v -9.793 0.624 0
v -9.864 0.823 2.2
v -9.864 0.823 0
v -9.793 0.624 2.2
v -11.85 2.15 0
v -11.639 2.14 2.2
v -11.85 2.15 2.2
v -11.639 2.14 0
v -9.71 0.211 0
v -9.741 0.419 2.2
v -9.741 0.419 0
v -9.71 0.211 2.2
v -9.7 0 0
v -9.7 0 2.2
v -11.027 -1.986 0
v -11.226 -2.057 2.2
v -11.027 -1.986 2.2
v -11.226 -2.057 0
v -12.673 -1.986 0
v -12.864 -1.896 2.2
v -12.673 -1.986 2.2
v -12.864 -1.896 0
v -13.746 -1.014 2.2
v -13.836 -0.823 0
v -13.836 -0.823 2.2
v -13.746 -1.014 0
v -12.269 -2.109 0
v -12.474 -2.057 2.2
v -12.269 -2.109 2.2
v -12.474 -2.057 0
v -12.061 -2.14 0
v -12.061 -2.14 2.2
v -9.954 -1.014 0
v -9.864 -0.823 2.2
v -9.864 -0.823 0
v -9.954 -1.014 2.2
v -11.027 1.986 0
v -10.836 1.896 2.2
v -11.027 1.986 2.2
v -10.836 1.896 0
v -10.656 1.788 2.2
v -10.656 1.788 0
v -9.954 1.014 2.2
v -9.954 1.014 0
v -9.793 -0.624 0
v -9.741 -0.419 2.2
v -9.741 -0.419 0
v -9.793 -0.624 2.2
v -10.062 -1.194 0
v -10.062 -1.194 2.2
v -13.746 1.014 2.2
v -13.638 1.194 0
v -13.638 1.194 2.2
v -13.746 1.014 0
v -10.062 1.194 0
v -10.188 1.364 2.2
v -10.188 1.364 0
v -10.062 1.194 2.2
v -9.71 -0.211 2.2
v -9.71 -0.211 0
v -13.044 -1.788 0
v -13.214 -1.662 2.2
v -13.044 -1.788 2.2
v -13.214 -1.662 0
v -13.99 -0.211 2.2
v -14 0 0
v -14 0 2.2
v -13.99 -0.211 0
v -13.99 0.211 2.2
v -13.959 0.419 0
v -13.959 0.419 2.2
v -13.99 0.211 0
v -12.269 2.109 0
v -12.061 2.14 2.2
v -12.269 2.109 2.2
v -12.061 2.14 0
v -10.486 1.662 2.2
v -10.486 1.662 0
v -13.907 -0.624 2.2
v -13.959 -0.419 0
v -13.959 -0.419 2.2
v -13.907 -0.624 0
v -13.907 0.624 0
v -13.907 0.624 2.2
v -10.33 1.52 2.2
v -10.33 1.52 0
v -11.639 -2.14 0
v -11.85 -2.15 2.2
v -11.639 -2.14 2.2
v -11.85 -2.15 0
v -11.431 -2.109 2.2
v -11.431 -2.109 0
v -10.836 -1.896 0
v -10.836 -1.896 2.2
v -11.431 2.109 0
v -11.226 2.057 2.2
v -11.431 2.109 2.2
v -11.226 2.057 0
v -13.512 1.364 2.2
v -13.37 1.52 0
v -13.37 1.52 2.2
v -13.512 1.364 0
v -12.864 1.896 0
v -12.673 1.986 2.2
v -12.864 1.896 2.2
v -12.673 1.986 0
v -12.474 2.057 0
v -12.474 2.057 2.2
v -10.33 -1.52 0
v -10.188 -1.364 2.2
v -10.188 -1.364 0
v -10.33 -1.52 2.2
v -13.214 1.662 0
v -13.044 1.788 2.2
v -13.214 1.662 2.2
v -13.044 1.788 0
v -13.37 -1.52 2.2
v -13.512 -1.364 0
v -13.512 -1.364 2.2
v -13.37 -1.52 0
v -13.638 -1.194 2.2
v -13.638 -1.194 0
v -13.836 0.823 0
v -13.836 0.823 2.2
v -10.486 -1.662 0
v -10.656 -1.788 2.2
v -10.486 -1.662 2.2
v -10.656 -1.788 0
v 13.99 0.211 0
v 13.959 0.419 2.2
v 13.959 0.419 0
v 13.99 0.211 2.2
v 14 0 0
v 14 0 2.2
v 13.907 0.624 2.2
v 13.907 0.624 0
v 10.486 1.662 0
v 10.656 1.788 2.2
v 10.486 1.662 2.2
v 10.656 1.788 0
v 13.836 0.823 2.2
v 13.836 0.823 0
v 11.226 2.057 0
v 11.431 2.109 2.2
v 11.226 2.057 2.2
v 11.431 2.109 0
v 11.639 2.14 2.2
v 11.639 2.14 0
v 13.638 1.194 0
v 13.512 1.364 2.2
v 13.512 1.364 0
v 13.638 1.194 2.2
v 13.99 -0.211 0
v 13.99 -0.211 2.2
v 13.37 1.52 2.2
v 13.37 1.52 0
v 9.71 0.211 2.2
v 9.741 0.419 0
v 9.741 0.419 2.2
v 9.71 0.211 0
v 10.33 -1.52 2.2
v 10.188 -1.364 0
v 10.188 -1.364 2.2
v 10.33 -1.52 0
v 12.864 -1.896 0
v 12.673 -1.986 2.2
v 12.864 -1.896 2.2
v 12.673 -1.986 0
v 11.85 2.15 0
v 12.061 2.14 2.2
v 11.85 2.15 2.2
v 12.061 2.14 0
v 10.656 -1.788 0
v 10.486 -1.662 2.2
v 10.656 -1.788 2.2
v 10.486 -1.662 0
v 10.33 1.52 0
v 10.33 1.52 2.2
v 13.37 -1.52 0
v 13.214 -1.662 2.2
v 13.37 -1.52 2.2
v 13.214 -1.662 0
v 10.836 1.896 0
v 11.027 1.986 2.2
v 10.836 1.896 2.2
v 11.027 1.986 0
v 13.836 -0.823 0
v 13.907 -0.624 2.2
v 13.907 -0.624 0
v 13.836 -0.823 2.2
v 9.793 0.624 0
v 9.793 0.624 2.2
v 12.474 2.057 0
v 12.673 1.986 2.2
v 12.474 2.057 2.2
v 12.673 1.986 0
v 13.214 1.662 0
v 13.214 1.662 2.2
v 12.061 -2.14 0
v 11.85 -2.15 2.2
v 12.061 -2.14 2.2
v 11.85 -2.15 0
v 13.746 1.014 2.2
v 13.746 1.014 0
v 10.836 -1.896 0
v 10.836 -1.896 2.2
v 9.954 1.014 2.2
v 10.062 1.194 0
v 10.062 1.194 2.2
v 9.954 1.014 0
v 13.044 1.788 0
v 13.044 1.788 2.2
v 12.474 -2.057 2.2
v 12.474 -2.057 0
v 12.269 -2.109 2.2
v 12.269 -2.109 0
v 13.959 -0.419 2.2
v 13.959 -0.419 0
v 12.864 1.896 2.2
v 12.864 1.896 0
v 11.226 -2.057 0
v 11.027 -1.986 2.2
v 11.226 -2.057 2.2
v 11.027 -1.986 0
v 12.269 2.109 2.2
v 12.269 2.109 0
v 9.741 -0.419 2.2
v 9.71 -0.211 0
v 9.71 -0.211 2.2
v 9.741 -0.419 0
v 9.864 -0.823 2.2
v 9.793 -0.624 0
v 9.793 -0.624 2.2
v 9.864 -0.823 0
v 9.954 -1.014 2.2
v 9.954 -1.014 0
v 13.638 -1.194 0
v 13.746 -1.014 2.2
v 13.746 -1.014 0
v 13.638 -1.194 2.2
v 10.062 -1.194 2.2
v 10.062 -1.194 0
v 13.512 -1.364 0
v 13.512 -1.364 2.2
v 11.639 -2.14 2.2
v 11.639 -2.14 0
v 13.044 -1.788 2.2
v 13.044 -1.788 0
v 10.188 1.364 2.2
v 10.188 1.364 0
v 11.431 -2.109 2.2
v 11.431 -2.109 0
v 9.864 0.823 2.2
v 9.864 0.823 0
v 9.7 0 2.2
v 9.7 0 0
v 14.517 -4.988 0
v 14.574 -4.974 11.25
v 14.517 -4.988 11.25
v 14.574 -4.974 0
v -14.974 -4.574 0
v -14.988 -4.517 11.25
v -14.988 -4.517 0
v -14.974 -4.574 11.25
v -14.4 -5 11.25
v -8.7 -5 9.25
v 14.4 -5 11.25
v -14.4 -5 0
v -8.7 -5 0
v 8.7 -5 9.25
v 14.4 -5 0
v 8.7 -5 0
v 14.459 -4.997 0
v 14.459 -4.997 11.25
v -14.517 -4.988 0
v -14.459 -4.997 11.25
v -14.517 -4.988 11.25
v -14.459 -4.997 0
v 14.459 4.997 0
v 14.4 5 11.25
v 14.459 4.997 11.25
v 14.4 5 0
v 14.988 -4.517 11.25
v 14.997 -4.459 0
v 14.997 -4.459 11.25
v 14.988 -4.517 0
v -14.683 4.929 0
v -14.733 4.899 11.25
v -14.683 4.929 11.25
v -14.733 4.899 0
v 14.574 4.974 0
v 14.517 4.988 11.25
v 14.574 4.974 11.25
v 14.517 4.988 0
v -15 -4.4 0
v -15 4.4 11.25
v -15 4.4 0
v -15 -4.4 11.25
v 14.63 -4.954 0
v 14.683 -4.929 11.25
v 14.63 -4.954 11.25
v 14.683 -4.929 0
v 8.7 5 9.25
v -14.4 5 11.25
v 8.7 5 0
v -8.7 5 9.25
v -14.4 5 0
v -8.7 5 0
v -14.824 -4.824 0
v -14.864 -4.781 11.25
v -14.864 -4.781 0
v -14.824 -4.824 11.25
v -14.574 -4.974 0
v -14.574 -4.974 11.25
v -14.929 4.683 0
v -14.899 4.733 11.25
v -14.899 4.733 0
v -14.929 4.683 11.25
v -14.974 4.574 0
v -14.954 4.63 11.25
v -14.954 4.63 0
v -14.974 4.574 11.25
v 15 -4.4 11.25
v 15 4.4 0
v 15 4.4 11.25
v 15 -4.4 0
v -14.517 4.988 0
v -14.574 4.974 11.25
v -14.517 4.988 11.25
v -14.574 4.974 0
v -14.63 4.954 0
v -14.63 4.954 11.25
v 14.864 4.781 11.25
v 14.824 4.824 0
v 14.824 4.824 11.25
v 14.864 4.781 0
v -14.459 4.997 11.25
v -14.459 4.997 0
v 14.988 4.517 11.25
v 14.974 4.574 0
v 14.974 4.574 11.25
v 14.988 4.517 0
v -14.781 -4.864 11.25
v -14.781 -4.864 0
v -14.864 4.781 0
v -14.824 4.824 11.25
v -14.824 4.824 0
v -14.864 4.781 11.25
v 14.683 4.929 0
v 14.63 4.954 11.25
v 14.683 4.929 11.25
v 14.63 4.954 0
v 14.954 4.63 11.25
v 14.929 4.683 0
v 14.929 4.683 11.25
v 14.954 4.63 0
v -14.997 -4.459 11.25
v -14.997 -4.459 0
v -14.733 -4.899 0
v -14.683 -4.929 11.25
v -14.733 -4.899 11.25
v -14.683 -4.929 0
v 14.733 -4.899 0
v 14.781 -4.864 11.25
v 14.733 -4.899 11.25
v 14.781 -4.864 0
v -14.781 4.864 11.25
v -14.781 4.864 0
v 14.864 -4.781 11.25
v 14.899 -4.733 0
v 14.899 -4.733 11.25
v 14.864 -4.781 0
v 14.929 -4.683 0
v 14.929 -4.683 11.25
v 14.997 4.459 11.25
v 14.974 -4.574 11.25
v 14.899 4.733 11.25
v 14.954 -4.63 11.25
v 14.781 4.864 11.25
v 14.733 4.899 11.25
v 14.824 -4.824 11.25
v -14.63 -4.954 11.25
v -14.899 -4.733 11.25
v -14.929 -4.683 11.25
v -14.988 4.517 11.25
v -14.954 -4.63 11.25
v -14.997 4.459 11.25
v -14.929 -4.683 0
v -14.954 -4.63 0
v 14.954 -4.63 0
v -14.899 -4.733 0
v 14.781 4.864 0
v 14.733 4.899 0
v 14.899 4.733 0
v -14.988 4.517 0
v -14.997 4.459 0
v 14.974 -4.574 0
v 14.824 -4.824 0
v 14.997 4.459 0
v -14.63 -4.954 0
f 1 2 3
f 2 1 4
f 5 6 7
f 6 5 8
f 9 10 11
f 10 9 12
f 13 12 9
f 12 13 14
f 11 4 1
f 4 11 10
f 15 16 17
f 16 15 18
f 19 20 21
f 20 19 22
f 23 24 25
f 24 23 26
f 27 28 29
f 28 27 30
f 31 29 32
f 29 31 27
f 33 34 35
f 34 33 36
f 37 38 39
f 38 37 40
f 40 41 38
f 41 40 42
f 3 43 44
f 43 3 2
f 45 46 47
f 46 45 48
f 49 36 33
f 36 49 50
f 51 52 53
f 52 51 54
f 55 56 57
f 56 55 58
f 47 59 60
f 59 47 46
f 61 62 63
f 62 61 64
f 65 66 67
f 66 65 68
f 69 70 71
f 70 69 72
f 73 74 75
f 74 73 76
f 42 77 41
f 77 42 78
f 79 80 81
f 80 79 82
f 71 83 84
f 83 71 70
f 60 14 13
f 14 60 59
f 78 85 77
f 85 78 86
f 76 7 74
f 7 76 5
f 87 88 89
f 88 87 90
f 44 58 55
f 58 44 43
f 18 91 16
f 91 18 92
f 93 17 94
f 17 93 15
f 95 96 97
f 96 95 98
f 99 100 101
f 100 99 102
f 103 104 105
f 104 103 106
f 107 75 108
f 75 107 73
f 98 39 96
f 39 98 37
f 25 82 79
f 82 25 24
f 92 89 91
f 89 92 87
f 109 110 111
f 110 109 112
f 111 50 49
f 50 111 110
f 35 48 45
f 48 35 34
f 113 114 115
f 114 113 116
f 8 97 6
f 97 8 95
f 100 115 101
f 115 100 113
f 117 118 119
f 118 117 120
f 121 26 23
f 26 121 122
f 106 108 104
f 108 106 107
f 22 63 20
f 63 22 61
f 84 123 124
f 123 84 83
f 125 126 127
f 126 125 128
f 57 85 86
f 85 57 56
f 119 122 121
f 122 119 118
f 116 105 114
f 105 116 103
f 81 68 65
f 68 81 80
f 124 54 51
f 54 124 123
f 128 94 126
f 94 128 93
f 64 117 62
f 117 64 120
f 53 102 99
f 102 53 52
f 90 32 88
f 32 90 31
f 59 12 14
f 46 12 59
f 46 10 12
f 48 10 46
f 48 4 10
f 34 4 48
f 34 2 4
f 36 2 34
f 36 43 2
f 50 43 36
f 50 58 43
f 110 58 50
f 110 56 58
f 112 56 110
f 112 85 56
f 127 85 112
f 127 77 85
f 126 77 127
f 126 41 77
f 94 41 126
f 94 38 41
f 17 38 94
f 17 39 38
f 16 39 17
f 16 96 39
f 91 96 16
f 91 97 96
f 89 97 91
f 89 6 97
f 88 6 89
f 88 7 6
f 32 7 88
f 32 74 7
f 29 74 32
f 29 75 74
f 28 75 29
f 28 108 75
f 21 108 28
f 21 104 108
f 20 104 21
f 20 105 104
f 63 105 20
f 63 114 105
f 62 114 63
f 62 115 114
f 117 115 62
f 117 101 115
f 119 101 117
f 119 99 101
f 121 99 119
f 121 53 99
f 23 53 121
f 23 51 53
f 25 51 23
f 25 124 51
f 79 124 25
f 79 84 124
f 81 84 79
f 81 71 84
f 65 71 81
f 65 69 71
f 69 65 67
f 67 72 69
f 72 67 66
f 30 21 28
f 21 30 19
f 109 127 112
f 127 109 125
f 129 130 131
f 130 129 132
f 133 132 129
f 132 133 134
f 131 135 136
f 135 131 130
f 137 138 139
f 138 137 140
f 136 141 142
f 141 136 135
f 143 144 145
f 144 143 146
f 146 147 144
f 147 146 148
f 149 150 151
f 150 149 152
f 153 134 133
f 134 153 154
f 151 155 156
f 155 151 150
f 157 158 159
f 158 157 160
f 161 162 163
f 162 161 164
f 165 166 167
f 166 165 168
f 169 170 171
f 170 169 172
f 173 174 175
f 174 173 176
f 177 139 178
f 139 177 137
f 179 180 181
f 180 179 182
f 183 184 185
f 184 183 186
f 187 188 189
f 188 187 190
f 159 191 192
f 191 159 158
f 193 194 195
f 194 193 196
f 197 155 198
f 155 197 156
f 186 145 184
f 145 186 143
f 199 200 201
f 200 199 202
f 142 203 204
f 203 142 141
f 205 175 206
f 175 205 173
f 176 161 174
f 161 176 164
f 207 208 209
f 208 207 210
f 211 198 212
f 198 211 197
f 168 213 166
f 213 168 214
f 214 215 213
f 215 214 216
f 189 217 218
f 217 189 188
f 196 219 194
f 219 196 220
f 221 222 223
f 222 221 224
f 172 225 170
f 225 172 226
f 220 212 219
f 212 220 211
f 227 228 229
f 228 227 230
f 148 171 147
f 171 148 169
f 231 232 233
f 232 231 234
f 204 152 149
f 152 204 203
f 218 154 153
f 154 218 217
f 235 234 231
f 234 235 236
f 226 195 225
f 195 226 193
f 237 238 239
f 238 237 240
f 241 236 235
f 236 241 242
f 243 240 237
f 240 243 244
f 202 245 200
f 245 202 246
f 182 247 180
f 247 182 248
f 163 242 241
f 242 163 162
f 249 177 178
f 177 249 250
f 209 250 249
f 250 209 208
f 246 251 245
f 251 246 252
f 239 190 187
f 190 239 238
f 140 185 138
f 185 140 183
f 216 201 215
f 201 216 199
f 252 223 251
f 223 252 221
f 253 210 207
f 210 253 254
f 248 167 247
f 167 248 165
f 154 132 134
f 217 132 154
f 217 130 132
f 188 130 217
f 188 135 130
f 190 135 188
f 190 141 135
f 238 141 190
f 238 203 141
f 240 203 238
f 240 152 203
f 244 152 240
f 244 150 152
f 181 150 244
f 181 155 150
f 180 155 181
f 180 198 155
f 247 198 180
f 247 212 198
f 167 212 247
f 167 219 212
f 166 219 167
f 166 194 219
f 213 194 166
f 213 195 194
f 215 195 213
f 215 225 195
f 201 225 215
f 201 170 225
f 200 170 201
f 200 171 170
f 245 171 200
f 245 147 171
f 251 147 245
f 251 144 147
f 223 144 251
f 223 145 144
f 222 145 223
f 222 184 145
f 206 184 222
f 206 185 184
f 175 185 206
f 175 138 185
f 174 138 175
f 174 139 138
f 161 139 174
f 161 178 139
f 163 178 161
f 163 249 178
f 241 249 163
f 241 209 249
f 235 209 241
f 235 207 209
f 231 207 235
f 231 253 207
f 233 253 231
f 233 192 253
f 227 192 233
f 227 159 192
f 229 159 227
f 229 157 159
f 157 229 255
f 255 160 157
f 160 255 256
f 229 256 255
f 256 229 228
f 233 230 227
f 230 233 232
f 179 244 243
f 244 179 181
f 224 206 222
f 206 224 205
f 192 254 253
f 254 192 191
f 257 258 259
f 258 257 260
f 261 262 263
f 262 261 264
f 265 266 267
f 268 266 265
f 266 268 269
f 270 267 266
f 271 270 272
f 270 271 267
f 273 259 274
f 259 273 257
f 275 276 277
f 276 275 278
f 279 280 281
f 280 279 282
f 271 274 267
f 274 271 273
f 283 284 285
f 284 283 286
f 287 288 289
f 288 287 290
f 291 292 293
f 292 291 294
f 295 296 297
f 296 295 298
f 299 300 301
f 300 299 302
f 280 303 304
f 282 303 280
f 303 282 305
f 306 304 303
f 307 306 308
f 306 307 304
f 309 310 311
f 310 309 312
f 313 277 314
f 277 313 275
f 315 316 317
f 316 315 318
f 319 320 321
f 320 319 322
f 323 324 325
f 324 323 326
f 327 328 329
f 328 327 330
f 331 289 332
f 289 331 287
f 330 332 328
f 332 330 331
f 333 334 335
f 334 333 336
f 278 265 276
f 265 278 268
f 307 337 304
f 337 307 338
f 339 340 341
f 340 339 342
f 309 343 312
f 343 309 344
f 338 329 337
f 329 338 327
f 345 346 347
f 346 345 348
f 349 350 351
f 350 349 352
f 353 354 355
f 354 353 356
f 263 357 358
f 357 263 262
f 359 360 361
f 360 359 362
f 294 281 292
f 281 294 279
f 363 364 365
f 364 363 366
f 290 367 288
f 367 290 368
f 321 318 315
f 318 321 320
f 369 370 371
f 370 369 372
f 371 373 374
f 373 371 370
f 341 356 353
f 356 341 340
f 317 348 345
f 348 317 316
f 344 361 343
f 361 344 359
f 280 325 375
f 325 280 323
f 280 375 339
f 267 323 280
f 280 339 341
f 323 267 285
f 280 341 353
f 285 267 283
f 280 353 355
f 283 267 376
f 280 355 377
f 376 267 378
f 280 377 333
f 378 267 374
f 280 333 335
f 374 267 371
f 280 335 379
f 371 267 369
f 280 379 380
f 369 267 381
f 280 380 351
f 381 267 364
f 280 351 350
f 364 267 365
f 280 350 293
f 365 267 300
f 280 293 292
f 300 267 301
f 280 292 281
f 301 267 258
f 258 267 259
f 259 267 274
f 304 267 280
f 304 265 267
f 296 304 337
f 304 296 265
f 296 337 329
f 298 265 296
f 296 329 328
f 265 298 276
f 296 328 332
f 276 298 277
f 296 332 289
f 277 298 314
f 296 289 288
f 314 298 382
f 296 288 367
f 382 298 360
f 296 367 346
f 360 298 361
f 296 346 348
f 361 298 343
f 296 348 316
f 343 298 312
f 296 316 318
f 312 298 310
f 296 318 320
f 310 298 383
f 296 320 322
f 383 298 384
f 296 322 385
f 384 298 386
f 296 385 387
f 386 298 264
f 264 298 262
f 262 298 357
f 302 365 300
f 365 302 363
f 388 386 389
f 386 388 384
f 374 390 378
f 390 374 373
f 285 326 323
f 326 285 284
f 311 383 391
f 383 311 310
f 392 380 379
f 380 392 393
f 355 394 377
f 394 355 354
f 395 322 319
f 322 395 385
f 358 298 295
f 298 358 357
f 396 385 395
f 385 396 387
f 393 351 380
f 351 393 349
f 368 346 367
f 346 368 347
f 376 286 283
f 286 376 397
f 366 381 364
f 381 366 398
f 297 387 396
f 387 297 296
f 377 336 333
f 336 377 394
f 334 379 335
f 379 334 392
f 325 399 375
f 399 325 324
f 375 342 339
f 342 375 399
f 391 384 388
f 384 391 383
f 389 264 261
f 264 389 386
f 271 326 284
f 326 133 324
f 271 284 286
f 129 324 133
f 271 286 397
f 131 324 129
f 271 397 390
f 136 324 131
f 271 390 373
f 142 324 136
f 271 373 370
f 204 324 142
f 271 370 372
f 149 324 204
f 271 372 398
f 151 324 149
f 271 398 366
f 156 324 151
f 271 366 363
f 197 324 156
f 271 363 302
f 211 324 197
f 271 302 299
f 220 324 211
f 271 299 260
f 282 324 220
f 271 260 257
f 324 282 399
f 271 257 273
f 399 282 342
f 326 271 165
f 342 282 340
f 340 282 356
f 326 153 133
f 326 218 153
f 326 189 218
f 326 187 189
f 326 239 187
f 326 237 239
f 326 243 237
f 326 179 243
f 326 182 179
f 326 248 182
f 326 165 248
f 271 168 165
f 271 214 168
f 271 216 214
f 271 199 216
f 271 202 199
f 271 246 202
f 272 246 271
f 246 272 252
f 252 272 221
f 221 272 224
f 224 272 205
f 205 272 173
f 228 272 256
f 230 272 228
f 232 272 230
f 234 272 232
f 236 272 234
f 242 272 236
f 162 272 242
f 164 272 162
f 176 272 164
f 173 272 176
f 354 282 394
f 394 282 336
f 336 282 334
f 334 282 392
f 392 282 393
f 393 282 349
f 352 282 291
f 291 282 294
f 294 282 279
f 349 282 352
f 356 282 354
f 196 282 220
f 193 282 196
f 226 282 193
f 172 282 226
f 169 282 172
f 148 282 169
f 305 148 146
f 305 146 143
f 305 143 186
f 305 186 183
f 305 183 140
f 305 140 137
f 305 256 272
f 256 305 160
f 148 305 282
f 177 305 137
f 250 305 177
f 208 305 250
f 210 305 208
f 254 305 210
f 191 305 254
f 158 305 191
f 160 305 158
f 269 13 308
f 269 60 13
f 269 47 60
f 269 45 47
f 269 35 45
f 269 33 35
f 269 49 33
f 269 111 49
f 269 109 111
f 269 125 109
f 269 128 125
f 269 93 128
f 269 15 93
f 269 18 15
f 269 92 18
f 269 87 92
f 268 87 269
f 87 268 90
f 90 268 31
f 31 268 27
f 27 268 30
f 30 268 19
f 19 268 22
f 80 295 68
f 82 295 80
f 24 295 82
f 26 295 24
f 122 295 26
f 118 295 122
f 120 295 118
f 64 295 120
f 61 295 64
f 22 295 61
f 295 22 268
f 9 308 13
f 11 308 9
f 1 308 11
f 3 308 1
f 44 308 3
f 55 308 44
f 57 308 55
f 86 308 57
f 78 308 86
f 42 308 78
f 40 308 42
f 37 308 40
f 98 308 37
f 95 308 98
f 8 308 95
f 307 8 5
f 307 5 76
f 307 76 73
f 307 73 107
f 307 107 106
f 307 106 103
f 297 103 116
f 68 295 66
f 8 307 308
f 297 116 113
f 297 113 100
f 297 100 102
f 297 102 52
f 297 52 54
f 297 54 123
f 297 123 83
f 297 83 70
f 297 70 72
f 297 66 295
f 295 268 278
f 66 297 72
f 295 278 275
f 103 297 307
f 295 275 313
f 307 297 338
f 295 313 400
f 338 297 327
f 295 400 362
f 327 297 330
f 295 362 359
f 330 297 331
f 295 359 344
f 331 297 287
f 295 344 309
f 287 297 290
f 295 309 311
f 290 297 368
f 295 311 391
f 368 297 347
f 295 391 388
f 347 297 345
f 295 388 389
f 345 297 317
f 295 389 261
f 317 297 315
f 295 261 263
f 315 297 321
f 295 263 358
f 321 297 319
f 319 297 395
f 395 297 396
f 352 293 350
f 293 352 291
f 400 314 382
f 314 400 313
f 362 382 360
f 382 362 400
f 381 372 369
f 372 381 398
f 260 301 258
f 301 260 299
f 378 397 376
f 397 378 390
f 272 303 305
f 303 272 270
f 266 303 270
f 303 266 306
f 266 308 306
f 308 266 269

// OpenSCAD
// bedroom / bench — a bed-end bench printed as a U: a plain seat slab at the full
// footprint, carried at each end by a panel that runs straight down FLUSH with the
// edge of the seat, with nothing between them. Cut it across the width and the piece
// is a U — slab plus two legs, open front and back — so the sides read as open space
// under the seat and not as a lidded box. No cushion, no pad: the seat is a flat top
// face, and the U underneath is what says bench.
//
// This is why it is a U and not the dining table's sloped apron (see
// diningroom/table.scad): the piece is printed UPSIDE DOWN, seat face on the bed.
// That way the void under the slab opens upward, so there is nothing to bridge and
// nothing overhangs; the magnet pockets come out as open holes in the top of the two
// standing panels; and the seat — the face you read the size off — is the first layer
// against the glass. The model itself stays the right way up like every other part
// (pockets at z = 0, in the bottom face); flip it in the slicer.
//
// Flip Show_lid on and the piece closes up into a plain solid slab carrying a lid
// seam instead — a storage bench / blanket box, which is a box and prints either way
// up.
//
// Width is the real-world footprint in cm: a bed-end bench runs 100 to 160 wide to
// match the bed it sits against (the branded IKEA EKENÄSET is 112 x 48). Depth is
// the seat depth, 40 for the plain benches. Height is the real seat height — the
// surface you sit on — shrunk by the plan scale like the footprint (see printed_h()
// in lib/common.scad), so a bench comes out about as low as a bed.

include <../lib/common.scad>

Width  = 120;  // cm — 100..160 to match the bed it sits against (EKENÄSET: 112)
Depth  = 40;   // cm — a bench's seat depth (EKENÄSET: 48)
Height = 45;   // cm — seat height, the surface you sit on

// the printed height, mm: Height at the plan scale
Print_h = printed_h(Height);

// The two legs of the U. Side is the real thickness of an end panel and Top the real
// thickness of the seat slab spanning between them — both are floored in printed mm,
// because both carry hardware or bridge a void:
//   Side  is raised to what a magnet pocket needs across (magnet_min_span — 6.3 mm
//         for the standard disc, so 25 cm at 1:40), the same way the dining table's
//         footing is: the panel feet are the only material left at floor level, so
//         they are where the magnets go.
//   Top   keeps at least Top_min of material over the void, so the slab is a few
//         solid layers on the bed rather than a skin.
// A bench too narrow to leave a usable opening between the panels just prints solid,
// and says so.
Side     = 12;   // cm — end panel, floored by the magnet pocket it has to hold
Top      = 8;    // cm — seat slab over the void
Top_min  = 1.2;  // mm — least material over the void, printed (a print detail)
Void_min = 1.2;  // mm — smallest opening worth leaving; below it, print solid

// A storage bench / blanket box instead: a plain solid slab (no panels, no void)
// carrying the seam of a hinged lid — a rim inset from the edge, drawn as four
// grooves so it reads as a line and not a second footprint. Off by default.
Show_lid  = false;
Lid_inset = 3;   // cm the lid seam sits in from the edge

// Magnet pockets in the bottom face (0 = none). On the U they can only go where
// there is material at floor level: one in the foot of each end panel, so 2 is the
// pair and 1 puts a single pocket under the left-hand panel. See Magnet_* in
// lib/common.scad. At 1:40 the 40 cm depth is 10 mm across, comfortably wide enough
// for a 4 mm disc, and Side is held to the 6.3 mm the pocket needs the other way.
Magnets = 2;

bench();

module bench() {
    // a U-section bench, or — with Show_lid — a plain lidded box
    if (Show_lid) box();
    else          frame();
}

// The U: a seat slab at the full footprint standing on an end panel at each end,
// both flush with the edge, and the space between them cut clean away front to back.
// The magnets go in the panel feet, the only material left at the floor.
module frame() {
    mag_d  = magnet_d_for(Width, Depth);
    // an end panel is at least as thick as a pocket needs across, as the dining
    // table's footing is (see table.scad) — the feet are what hold the magnets
    side   = max(cm(Side), magnet_min_span(mag_d));
    top    = min(max(cm(Top), Top_min), Print_h);
    gap    = cm(Width) - 2 * side;   // the opening between the panels
    void_h = Print_h - top;          // ... and how far it reaches up under the slab
    hollow = gap >= Void_min && void_h >= Void_min;
    if (cm(Side) < side)
        echo(str("NOTE: ", Side, " cm end panels at 1:", Scale, " are thinner than a ",
                 mag_d, " mm pocket needs — printed as ", plan_cm(side), " cm"));
    if (!hollow)
        echo(str("NOTE: ", Width, "x", Depth, " cm at 1:", Scale,
                 " leaves no room under the seat for a U — printed solid"));
    difference() {
        footprint(Width, Depth, Print_h);
        if (hollow)
            void(gap, void_h);
        if (Magnets > 0)
            feet_magnets(side, mag_d);
    }
}

// The space under the seat: a straight cut <w> mm wide and <h> mm tall, running the
// whole depth so it is open at the front and the back — the inside of the U. Square
// inner faces, so only the outer corners of the piece stay rounded.
module void(w, h) {
    translate([0, 0, h / 2 - 0.005])
        cube([w, cm(Depth) + 1, h + 0.01], center = true);
}

// A pocket in the foot of each end panel — centred in a panel <side> mm thick, which
// is the whole of the piece that touches the board. Placed by hand rather than with
// magnets(): that spreads a row along the width, and on a U the middle of the width
// is thin air.
module feet_magnets(side, mag_d) {
    count  = min(Magnets, 2);
    foot_x = (cm(Width) - side) / 2;
    fits   = cm(Depth) >= magnet_min_span(mag_d);
    if (Magnets > count)
        echo(str("WARNING: a U bench has 2 feet — cutting ", count, " of ", Magnets,
                 " magnets"));
    if (!fits)
        echo(str("WARNING: ", Depth, " cm deep at 1:", Scale, " is too narrow for a ",
                 mag_d, " mm pocket — no magnets cut"));
    else
        for (i = [0 : count - 1])
            magnet_pocket(i == 0 ? -foot_x : foot_x, 0, mag_d, magnet_h_for(mag_d));
}

// A storage bench / blanket box: a plain solid slab at the full footprint carrying
// the lid seam. No panels and no void — a box sits flat on the floor.
module box() {
    difference() {
        footprint(Width, Depth, Print_h);
        lid_seam(Print_h);
        if (Magnets > 0)
            magnets(Width, Depth, Magnets);
    }
}

// The seam a hinged lid leaves: a rectangular rim inset from the edge, drawn as
// four groove() edges (top, bottom, left, right) instead of one filled cut, so it
// reads as a line around the lid panel and not a second footprint. The line is
// held to one nozzle width in printed mm, converted back to the real-world cm
// groove() takes, so it stays readable at any Scale.
module lid_seam(top_z, inset = Lid_inset) {
    stroke = Symbol_stroke * Scale / 10;  // one nozzle, back-converted to real cm
    hw = Width / 2 - inset;
    hd = Depth / 2 - inset;
    groove(0,   hd, 2 * hw + stroke, stroke, top_z);
    groove(0,  -hd, 2 * hw + stroke, stroke, top_z);
    groove(-hw,  0, stroke, 2 * hd + stroke, top_z);
    groove( hw,  0, stroke, 2 * hd + stroke, top_z);
}
